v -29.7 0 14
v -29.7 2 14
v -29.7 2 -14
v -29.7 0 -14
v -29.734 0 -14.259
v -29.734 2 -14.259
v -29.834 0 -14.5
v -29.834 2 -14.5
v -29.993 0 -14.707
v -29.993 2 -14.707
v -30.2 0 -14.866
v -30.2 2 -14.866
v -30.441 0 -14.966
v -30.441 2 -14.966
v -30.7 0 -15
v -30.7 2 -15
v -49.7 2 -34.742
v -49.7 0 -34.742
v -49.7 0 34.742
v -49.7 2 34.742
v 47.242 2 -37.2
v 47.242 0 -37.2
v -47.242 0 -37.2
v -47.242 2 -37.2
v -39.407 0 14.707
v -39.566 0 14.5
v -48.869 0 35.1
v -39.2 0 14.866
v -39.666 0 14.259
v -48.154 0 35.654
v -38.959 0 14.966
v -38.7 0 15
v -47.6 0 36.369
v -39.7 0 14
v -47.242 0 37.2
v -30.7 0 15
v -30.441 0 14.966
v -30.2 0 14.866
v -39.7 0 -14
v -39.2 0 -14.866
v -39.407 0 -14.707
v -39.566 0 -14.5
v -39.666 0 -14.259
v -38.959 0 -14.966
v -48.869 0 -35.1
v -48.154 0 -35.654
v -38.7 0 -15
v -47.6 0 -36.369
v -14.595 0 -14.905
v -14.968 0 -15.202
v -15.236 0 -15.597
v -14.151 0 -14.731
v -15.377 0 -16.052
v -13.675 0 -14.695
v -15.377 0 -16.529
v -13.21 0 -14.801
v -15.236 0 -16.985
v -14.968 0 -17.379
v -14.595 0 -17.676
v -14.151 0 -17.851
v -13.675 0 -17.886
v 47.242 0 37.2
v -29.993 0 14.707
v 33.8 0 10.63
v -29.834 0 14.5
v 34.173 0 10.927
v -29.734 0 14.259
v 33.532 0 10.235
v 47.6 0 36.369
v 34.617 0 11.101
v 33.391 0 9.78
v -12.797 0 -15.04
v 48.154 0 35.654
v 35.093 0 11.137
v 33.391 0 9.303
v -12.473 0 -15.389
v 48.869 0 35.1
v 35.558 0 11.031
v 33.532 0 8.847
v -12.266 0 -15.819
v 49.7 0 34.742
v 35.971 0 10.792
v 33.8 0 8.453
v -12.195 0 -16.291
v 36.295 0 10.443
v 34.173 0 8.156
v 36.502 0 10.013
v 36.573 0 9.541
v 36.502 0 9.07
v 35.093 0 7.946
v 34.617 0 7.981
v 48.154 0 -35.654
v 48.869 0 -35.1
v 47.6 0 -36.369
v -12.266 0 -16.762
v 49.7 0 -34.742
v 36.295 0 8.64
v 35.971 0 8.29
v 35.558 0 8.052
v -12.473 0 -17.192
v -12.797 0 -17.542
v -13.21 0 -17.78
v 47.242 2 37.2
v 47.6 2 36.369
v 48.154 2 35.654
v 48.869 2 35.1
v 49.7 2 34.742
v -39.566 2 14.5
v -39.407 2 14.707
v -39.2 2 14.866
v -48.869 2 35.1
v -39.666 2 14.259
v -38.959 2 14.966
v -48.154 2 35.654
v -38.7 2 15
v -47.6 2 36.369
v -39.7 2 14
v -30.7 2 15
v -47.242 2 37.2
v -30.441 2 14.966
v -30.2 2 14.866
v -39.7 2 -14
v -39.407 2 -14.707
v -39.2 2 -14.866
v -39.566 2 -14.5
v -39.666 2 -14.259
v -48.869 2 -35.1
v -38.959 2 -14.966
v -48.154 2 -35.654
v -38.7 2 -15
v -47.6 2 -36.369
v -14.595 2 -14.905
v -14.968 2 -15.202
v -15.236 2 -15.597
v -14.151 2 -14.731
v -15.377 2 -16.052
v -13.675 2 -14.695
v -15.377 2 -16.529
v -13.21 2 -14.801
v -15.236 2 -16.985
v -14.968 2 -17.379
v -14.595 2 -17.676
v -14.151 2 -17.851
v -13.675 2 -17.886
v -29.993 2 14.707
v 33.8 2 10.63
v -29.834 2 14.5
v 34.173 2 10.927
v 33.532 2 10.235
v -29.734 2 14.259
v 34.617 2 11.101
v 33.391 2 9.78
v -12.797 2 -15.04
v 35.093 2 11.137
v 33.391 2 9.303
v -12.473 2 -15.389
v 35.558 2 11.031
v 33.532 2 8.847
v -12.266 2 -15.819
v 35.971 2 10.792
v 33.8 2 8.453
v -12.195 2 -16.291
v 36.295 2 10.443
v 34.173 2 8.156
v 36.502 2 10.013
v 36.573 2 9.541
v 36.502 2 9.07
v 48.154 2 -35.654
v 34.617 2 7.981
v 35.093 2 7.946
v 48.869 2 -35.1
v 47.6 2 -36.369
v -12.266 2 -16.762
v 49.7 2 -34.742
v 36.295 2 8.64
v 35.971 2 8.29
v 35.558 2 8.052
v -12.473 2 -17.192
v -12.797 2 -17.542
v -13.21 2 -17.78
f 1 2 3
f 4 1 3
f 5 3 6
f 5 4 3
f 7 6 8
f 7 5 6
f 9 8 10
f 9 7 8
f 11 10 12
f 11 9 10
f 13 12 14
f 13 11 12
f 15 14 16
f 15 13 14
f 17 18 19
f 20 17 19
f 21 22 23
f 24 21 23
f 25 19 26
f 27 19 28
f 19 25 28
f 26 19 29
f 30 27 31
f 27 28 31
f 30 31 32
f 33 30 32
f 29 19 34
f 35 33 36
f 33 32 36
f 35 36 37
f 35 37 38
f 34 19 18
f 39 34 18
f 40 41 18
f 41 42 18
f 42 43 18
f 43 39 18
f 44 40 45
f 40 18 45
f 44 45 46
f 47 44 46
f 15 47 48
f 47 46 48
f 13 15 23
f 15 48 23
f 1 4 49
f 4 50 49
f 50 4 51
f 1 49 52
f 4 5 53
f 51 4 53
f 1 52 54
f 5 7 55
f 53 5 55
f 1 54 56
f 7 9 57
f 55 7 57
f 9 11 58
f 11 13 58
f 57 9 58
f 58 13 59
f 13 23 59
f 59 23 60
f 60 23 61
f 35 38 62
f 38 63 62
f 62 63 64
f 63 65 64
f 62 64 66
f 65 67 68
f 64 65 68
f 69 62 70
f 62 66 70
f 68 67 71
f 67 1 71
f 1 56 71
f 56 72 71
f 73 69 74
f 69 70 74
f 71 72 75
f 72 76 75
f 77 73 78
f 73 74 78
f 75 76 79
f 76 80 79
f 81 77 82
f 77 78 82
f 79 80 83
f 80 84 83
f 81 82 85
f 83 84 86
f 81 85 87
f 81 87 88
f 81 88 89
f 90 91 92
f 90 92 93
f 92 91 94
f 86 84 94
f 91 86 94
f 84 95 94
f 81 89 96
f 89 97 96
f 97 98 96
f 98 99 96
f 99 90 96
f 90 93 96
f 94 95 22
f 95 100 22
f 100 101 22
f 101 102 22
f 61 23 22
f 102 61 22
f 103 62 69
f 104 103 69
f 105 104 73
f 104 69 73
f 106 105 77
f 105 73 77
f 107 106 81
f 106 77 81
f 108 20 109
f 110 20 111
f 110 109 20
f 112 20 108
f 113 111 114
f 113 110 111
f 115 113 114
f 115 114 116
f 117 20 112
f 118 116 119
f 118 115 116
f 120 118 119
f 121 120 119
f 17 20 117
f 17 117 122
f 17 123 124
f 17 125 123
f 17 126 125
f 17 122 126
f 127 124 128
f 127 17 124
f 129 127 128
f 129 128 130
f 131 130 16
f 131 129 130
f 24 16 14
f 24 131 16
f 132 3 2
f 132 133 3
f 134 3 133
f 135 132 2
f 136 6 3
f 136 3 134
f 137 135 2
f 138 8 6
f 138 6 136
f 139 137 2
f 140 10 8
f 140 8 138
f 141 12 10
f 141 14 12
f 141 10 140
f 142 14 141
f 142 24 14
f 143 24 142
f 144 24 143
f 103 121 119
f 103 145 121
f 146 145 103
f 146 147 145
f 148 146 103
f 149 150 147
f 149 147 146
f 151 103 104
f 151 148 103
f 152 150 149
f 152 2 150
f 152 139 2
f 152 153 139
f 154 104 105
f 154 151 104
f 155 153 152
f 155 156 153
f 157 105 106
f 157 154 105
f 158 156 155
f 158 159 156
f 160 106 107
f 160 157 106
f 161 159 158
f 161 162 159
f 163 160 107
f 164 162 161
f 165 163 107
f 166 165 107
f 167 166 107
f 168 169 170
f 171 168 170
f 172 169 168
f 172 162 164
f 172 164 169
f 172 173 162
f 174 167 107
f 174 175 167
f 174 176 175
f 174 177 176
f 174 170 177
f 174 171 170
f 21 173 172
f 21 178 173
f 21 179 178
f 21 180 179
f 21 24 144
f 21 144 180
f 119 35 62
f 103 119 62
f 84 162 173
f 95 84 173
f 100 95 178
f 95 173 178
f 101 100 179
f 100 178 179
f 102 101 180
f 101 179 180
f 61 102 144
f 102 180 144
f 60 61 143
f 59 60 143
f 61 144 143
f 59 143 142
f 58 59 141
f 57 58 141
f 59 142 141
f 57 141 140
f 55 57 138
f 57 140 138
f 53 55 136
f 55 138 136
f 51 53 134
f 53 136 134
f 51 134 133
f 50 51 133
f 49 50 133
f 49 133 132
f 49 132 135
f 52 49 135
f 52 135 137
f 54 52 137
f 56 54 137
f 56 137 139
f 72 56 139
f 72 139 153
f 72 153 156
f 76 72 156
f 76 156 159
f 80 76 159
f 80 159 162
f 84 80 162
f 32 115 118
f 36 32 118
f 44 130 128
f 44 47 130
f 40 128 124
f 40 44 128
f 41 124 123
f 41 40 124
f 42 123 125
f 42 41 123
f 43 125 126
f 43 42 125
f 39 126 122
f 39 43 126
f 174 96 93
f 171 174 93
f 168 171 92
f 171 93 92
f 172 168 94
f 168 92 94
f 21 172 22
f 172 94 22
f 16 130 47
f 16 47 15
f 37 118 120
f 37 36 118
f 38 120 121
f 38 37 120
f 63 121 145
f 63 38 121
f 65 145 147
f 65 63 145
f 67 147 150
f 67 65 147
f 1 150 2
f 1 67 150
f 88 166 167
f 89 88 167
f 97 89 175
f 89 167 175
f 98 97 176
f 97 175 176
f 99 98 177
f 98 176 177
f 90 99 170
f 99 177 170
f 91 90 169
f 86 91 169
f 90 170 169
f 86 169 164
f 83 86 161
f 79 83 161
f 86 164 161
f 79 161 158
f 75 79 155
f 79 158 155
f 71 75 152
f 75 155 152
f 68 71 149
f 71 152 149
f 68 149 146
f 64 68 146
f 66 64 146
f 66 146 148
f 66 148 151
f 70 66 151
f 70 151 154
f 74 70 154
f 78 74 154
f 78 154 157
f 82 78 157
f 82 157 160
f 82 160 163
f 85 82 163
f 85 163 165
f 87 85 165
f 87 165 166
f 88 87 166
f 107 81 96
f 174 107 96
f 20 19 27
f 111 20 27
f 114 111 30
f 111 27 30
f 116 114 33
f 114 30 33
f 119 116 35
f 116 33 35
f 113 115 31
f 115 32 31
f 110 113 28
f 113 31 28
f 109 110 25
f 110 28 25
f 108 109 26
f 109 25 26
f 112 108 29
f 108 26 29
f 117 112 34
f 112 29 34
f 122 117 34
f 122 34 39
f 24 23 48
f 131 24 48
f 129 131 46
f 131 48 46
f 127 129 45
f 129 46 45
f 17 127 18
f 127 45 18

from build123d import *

# Parameters (mm, degrees)
BOSS_EXTRUDE1_DEPTH = 2
SKETCH2_W           = 10
SKETCH2_H           = 30
CUT_EXTRUDE1_DEPTH  = 3
FILLET1_R           = 1
CUT_EXTRUDE2_REACH  = 4
SKETCH3_R           = 1.6


with BuildPart() as part:
    # Sketch1 → Boss-Extrude1 (new body)
    with BuildSketch(Plane(origin=(0, 0, 0), x_dir=(1, 0, 0), z_dir=(0, 1, 0))):
        with BuildLine():
            ThreePointArc((-49.7, -34.741676707), (-48.154415588, -35.654415588), (-47.241676707, -37.2))
            Line((-47.241676707, -37.2), (47.241676707, -37.2))
            ThreePointArc((47.241676707, -37.2), (48.154415588, -35.654415588), (49.7, -34.741676707))
            Line((49.7, -34.741676707), (49.7, 34.741676707))
            ThreePointArc((49.7, 34.741676707), (48.154415588, 35.654415588), (47.241676707, 37.2))
            Line((47.241676707, 37.2), (-47.241676707, 37.2))
            ThreePointArc((-47.241676707, 37.2), (-48.154415588, 35.654415588), (-49.7, 34.741676707))
            Line((-49.7, 34.741676707), (-49.7, -34.741676707))
        make_face()
    extrude(amount=BOSS_EXTRUDE1_DEPTH)

    # Sketch2 → Cut-Extrude1 (cut, through all)
    with BuildSketch(Plane(origin=(0, 2, 0), x_dir=(1, 0, 0), z_dir=(0, 1, 0))):
        with Locations((-34.7, 0)):
            Rectangle(SKETCH2_W, SKETCH2_H)
    extrude(amount=-CUT_EXTRUDE1_DEPTH, mode=Mode.SUBTRACT)

    # Fillet1
    fillet1_edges = [part.edges().sort_by_distance(p)[0] for p in [
        (-29.7, 1, -15),
        (-29.7, 1, 15),
        (-39.7, 1, 15),
        (-39.7, 1, -15),
    ]]
    fillet(fillet1_edges, radius=FILLET1_R)

    # Sketch3 → Cut-Extrude2 (cut, up to next)
    with BuildSketch(Plane(origin=(0, 2, 0), x_dir=(1, 0, 0), z_dir=(0, 1, 0)), mode=Mode.PRIVATE) as cut_extrude2_sk1:
        with Locations((-13.794673406, 16.290721811)):
            Circle(SKETCH3_R)
    cut_extrude2_tool1 = extrude(cut_extrude2_sk1.sketch, amount=-CUT_EXTRUDE2_REACH, mode=Mode.PRIVATE) & part.part
    add(cut_extrude2_tool1.solids().sort_by_distance((-13.794673, 2, -16.290722))[0], mode=Mode.SUBTRACT)
    # Sketch3 → Cut-Extrude2 (cut, up to next)
    with BuildSketch(Plane(origin=(0, 2, 0), x_dir=(1, 0, 0), z_dir=(0, 1, 0)), mode=Mode.PRIVATE) as cut_extrude2_sk2:
        with Locations((34.973326594, -9.541278189)):
            Circle(SKETCH3_R)
    cut_extrude2_tool2 = extrude(cut_extrude2_sk2.sketch, amount=-CUT_EXTRUDE2_REACH, mode=Mode.PRIVATE) & part.part
    add(cut_extrude2_tool2.solids().sort_by_distance((34.973327, 2, 9.541278))[0], mode=Mode.SUBTRACT)


solid = part.part
